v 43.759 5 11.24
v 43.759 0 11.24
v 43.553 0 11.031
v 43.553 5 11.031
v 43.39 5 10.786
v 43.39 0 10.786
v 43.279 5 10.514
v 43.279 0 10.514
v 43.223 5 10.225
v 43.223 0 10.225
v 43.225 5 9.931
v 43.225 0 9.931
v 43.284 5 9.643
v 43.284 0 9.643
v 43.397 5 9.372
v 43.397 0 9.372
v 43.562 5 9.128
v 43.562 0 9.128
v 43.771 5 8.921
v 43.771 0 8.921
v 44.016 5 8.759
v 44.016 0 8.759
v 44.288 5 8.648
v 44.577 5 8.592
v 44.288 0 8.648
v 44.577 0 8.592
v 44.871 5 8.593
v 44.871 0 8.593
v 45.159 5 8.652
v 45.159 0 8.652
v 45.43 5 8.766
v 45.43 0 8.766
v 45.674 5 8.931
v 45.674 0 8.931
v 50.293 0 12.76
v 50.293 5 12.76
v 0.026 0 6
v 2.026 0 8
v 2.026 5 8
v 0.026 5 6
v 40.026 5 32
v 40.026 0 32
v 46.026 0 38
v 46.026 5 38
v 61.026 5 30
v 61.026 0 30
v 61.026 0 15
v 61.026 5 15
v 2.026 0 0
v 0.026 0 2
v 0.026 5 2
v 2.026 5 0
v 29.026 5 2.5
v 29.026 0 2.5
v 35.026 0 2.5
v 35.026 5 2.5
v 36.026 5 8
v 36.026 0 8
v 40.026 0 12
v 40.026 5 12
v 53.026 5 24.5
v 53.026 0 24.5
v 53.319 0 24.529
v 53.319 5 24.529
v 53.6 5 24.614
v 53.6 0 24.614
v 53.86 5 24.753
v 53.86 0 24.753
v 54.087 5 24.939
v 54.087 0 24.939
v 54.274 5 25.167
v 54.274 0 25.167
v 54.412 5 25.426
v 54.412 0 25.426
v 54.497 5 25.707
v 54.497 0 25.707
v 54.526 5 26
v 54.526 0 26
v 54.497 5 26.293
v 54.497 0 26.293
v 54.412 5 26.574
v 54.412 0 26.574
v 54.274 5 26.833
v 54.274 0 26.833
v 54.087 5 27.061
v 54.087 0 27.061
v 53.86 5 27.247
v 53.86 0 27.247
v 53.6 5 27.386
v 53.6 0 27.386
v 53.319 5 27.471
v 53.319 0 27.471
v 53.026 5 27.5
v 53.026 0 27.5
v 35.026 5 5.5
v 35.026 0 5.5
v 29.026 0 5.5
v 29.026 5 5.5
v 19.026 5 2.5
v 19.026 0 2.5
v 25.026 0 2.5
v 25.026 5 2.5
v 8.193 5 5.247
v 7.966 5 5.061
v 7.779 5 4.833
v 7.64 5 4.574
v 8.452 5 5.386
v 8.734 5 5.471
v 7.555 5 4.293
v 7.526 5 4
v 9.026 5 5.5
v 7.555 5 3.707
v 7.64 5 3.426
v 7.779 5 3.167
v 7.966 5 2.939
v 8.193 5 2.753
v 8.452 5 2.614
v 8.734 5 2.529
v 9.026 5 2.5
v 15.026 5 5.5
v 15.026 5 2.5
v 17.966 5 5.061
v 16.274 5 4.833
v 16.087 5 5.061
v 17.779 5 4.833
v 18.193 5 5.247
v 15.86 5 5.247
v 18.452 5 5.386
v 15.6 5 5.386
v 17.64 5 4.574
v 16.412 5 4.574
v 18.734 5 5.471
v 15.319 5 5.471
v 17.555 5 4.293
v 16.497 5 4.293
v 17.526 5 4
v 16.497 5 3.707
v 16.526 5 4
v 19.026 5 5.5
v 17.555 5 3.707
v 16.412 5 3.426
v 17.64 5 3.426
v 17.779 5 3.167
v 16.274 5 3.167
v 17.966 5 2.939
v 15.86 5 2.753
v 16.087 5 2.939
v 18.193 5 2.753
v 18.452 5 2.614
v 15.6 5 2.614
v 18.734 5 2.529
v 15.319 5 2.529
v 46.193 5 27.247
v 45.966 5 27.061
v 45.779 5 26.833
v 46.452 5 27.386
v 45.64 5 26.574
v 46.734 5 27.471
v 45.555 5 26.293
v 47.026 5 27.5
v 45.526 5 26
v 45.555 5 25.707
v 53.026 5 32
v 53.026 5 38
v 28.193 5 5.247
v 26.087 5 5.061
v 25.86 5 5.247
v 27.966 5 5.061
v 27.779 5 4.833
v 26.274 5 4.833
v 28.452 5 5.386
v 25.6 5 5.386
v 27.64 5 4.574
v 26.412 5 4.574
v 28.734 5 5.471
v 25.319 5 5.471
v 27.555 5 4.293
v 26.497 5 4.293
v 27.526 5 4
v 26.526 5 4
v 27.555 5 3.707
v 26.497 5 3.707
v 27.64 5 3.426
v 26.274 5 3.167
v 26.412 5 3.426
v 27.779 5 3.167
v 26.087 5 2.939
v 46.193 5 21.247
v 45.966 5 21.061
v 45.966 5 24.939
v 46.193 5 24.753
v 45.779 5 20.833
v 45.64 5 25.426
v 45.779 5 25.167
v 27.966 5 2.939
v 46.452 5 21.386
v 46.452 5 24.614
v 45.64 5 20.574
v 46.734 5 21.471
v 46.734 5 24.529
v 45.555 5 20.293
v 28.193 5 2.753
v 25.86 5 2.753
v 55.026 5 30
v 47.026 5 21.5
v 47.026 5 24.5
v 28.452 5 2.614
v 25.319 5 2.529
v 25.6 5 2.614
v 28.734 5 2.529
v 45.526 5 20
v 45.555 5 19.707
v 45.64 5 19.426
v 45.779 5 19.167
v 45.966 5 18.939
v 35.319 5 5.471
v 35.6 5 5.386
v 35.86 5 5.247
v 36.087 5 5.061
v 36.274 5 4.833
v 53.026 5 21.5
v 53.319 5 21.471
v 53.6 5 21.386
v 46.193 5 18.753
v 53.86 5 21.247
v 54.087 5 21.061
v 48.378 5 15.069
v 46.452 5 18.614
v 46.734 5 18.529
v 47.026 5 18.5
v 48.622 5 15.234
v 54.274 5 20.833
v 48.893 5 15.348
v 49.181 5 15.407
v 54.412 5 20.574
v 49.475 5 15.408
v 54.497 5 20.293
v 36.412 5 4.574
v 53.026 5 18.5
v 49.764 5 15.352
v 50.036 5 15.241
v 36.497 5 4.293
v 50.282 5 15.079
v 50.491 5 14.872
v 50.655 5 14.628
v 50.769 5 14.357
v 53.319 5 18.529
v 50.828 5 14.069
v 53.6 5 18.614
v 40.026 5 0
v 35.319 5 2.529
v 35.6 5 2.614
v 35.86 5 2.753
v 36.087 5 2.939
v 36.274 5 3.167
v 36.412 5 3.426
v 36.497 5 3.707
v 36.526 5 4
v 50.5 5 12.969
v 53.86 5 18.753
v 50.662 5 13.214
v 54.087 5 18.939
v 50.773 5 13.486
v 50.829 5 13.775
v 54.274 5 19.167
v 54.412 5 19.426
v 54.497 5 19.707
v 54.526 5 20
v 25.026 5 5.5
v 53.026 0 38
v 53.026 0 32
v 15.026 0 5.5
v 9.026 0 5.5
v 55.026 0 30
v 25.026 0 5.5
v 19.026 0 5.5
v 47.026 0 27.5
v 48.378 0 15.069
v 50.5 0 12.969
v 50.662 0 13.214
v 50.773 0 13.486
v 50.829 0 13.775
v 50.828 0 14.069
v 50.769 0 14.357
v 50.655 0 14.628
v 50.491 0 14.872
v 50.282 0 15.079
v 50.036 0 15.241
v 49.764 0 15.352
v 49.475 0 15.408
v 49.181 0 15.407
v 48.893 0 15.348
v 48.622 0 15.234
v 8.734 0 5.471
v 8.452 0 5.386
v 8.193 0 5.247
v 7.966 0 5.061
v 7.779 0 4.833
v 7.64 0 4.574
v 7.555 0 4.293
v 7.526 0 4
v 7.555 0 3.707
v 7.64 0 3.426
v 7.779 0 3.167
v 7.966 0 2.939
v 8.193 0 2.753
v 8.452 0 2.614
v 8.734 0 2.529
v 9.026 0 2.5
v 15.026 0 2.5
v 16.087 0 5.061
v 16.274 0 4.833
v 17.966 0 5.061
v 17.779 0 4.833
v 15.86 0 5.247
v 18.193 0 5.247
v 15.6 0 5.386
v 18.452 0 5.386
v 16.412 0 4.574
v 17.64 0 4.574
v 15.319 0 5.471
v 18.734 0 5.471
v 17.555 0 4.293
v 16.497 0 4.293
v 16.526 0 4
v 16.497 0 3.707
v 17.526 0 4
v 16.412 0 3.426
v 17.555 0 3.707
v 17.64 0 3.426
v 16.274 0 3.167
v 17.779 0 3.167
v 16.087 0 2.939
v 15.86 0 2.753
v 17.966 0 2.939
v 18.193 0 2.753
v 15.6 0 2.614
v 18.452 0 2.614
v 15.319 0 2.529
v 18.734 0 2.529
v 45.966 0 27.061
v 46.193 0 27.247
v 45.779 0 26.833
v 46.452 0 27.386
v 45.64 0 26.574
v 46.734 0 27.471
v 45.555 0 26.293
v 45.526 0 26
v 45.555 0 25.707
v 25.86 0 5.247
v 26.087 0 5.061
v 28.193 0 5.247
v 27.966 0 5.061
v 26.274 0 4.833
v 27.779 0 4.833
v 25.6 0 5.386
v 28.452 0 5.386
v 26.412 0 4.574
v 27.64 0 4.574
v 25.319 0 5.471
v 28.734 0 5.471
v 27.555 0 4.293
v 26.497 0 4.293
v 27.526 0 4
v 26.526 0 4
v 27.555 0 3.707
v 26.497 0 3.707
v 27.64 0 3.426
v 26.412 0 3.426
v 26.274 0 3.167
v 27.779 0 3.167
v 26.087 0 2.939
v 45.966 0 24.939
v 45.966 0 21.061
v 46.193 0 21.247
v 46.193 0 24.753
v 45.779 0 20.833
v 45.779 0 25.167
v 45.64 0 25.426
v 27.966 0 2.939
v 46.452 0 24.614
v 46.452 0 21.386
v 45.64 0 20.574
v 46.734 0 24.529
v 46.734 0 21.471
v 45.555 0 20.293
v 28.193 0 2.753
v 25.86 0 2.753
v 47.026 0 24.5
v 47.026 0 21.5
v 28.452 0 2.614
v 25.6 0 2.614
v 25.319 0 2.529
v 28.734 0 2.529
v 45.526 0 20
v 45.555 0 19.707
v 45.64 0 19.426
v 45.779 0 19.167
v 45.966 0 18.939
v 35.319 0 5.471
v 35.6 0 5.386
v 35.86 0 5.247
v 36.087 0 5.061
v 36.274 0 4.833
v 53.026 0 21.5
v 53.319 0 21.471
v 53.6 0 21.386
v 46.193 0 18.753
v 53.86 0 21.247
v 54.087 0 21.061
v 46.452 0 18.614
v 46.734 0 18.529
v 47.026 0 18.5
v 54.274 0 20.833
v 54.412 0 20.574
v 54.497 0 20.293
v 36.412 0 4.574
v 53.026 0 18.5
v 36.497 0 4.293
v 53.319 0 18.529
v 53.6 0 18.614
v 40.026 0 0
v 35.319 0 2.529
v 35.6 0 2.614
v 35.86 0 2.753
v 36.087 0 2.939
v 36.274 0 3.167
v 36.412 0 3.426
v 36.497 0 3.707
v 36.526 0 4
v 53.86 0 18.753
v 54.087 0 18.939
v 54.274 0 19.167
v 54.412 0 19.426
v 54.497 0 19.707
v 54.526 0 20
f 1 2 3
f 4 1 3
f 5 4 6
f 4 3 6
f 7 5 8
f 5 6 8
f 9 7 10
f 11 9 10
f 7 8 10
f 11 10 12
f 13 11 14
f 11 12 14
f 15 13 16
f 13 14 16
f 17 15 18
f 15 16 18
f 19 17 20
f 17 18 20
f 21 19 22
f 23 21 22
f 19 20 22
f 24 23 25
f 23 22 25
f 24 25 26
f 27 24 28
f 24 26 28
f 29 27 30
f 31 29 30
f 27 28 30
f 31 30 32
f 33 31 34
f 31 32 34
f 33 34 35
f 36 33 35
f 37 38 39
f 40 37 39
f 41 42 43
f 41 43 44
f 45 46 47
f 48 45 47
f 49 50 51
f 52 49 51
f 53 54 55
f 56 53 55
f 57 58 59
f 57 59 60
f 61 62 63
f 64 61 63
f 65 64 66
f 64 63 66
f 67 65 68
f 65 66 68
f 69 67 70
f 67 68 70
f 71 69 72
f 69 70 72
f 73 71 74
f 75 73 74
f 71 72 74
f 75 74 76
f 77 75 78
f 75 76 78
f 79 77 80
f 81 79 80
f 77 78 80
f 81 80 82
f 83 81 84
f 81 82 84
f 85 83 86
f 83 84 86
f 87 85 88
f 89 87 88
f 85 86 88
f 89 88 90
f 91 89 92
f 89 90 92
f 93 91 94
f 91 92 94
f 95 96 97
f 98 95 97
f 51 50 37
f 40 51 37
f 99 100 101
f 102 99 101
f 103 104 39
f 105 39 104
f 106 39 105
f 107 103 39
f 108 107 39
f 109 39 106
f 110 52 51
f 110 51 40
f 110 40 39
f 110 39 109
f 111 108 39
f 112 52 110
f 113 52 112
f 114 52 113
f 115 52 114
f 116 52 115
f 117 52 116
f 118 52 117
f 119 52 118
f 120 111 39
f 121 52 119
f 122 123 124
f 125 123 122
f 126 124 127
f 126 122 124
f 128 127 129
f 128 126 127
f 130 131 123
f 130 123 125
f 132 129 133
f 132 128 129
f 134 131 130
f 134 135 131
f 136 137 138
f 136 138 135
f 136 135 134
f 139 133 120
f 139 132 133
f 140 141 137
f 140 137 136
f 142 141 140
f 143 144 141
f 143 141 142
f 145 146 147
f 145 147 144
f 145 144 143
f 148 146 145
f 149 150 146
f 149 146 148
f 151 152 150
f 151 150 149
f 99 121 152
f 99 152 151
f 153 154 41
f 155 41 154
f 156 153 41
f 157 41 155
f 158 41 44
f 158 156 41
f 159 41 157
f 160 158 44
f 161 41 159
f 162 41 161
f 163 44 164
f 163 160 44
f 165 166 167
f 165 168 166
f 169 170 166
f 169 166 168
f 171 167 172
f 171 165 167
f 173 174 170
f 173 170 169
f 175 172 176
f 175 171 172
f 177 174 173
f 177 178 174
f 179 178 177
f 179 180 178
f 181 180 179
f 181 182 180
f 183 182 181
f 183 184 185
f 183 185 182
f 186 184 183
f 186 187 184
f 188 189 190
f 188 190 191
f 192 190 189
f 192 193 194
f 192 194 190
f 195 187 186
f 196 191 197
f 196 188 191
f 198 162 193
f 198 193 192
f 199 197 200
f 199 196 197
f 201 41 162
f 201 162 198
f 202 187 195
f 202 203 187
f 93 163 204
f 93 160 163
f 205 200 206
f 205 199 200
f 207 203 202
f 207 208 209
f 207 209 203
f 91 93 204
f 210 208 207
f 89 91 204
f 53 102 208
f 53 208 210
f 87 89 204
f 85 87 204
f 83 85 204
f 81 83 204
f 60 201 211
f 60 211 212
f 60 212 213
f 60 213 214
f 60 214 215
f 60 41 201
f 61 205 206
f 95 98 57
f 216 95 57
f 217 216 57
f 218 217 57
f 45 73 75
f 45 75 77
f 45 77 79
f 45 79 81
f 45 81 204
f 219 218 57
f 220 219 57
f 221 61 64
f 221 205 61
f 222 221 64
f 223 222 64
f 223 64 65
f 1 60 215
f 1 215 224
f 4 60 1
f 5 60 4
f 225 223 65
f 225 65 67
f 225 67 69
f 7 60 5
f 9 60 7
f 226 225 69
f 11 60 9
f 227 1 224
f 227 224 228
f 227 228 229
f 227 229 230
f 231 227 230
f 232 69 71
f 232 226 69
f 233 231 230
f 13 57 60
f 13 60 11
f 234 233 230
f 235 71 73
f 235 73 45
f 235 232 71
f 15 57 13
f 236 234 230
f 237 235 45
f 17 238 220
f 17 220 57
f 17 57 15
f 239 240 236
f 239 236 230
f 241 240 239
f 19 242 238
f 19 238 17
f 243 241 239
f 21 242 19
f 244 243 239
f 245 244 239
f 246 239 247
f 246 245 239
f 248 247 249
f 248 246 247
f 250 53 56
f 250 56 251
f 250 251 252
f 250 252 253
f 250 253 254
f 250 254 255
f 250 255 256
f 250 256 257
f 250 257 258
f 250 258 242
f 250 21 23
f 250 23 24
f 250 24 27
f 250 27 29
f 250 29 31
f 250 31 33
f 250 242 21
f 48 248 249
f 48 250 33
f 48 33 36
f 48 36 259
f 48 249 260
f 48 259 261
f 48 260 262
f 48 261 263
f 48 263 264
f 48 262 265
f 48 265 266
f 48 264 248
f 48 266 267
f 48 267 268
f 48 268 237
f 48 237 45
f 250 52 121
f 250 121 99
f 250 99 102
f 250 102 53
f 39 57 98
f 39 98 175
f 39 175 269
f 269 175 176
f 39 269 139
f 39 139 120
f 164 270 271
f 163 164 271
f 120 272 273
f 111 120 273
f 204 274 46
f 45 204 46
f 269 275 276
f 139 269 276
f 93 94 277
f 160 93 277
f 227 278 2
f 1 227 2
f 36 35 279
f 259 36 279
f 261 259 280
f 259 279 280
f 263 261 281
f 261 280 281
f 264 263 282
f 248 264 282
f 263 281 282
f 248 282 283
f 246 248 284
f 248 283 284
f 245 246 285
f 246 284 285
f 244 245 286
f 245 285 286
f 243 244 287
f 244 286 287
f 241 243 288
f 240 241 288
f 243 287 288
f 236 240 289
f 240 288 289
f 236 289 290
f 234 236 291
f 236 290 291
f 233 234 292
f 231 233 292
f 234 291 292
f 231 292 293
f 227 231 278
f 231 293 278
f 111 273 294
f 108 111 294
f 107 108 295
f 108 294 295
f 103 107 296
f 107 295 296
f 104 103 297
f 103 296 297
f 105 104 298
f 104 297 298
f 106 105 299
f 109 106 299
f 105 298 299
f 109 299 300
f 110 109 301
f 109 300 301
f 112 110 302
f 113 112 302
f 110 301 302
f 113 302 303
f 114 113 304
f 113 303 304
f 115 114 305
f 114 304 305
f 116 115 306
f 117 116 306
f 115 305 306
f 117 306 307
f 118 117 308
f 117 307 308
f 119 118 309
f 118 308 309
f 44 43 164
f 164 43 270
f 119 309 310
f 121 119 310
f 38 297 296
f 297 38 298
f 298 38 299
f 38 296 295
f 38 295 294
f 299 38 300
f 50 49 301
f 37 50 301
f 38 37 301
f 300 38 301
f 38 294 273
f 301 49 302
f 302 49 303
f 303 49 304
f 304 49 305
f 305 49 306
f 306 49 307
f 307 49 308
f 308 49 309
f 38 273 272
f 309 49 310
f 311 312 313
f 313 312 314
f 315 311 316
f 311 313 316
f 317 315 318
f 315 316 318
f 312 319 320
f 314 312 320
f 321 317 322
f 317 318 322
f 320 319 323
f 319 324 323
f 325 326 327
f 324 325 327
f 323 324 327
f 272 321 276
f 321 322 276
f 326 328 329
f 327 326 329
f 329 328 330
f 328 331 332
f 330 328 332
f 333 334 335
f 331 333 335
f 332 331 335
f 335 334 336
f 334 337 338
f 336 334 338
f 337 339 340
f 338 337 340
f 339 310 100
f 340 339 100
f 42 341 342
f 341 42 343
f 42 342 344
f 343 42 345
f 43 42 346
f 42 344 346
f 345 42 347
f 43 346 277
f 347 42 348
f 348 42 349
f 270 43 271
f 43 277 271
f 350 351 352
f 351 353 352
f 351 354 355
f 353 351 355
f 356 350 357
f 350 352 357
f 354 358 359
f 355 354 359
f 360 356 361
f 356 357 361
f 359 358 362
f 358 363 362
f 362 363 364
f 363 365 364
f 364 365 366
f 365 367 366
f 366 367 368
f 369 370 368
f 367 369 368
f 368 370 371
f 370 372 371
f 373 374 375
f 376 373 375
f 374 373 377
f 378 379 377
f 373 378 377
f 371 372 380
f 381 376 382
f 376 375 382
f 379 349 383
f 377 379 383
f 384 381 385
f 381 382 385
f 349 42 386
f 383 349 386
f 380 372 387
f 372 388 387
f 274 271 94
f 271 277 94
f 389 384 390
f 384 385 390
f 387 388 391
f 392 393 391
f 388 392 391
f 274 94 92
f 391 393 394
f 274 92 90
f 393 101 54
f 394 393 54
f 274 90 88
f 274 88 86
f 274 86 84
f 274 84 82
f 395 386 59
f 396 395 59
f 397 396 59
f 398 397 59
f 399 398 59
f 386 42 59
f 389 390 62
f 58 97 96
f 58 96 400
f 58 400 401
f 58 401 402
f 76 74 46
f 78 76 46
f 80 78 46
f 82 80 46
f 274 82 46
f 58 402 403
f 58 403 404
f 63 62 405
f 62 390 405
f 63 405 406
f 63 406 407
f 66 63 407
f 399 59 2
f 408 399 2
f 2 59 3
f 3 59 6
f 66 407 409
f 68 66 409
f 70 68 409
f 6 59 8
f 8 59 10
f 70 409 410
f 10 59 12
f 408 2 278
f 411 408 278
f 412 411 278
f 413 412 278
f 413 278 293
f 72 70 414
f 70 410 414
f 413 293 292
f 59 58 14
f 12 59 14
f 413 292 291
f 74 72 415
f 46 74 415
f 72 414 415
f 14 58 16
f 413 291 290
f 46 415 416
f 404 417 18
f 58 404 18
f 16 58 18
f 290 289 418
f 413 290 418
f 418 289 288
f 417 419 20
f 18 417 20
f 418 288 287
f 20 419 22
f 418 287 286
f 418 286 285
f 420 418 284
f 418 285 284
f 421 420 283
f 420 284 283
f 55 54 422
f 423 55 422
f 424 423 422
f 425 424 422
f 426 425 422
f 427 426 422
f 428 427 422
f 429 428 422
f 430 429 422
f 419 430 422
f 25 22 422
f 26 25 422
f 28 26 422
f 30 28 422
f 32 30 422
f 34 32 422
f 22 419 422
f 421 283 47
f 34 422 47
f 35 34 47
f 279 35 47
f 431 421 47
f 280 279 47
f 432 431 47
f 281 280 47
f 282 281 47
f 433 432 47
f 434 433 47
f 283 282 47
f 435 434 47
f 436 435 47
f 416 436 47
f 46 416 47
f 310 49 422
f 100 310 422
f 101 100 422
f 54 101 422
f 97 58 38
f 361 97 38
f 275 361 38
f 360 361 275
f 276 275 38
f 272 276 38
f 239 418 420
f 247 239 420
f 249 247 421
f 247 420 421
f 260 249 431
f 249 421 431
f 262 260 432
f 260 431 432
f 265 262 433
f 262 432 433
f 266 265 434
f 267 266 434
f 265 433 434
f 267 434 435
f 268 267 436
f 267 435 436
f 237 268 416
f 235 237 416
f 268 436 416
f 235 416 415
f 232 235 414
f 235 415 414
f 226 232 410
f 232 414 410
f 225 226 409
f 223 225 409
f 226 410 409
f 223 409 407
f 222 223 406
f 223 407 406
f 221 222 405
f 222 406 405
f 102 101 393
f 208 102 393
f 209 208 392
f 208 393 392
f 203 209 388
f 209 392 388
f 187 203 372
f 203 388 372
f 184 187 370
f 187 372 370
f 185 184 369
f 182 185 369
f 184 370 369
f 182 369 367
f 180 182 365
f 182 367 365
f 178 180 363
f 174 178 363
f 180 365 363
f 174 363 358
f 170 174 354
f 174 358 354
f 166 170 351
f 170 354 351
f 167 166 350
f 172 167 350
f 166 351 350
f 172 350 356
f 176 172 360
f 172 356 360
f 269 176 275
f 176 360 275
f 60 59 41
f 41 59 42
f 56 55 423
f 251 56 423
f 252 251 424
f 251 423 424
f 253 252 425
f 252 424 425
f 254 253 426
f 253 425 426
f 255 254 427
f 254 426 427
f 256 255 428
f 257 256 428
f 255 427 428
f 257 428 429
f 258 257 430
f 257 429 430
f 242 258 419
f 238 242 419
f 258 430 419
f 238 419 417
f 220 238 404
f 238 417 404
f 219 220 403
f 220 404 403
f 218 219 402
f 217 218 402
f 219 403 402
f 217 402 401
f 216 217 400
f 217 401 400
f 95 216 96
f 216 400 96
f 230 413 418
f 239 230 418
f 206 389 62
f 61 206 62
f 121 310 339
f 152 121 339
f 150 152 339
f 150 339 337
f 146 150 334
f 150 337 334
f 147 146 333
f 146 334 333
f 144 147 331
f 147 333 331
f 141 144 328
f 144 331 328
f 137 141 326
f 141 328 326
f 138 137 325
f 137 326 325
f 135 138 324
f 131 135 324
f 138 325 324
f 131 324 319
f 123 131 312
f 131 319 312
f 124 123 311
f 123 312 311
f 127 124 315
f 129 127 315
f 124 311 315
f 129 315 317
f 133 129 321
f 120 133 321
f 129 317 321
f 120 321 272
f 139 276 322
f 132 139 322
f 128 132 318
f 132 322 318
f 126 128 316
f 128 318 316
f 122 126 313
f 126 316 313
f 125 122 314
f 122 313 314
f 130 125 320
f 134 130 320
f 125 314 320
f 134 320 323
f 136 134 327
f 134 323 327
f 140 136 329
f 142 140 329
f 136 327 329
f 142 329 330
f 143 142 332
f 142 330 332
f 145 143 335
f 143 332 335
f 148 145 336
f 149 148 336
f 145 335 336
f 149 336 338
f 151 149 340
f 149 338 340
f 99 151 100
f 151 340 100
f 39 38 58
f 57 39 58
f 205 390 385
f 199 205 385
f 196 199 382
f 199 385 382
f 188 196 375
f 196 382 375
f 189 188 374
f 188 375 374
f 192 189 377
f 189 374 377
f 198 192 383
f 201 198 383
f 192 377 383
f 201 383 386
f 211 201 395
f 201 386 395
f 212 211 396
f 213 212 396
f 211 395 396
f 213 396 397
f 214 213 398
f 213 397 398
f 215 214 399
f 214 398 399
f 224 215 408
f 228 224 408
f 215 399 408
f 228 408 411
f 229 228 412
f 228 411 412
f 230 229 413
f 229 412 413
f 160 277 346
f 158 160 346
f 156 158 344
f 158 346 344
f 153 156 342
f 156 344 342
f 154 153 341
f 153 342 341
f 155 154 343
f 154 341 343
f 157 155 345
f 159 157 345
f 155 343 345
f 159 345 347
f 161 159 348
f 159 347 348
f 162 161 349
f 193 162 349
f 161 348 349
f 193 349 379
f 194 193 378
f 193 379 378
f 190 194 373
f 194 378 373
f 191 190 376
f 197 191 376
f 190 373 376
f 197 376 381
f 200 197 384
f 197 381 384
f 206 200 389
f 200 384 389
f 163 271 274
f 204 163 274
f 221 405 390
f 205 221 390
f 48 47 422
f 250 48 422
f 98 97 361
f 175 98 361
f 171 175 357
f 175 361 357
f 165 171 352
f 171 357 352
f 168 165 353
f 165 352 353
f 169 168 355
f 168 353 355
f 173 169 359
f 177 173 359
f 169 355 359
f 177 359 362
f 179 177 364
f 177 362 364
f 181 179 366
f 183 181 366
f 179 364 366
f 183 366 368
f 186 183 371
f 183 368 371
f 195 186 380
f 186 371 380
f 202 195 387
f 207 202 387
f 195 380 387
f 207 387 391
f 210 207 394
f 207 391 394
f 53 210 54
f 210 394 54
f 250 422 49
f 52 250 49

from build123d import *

# Parameters (mm, degrees)
BOSS_EXTRUDE1_DEPTH = 5
CHAMFER1_SIZE       = 2
CHAMFER2_SIZE       = 6
CHAMFER3_SIZE       = 4


with BuildPart() as part:
    # Sketch2 → Boss-Extrude1 (new body)
    with BuildSketch(Plane(origin=(0, 0, 0), x_dir=(1, 0, 0), z_dir=(0, 1, 0))):
        Polygon((40.026305405, 0), (0.026305405, 0), (0.026305405, -8), (40.026305405, -8), (40.026305405, -38), (53.026305405, -38), (53.026305405, -32), (55.026305405, -30), (61.026305405, -30), (61.026305405, -15), align=None)
        with BuildLine():
            ThreePointArc((47.026305405, -27.5), (45.526305405, -26), (47.026305405, -24.5))
            Line((47.026305405, -24.5), (53.026305405, -24.5))
            ThreePointArc((53.026305405, -24.5), (54.526305405, -26), (53.026305405, -27.5))
            Line((53.026305405, -27.5), (47.026305405, -27.5))
        make_face(mode=Mode.SUBTRACT)
        with BuildLine():
            ThreePointArc((47.026305405, -21.5), (45.526305405, -20), (47.026305405, -18.5))
            Line((47.026305405, -18.5), (53.026305405, -18.5))
            ThreePointArc((53.026305405, -18.5), (54.526305405, -20), (53.026305405, -21.5))
            Line((53.026305405, -21.5), (47.026305405, -21.5))
        make_face(mode=Mode.SUBTRACT)
        with BuildLine():
            ThreePointArc((9.026305405, -5.5), (7.526305405, -4), (9.026305405, -2.5))
            Line((9.026305405, -2.5), (15.026305405, -2.5))
            ThreePointArc((15.026305405, -2.5), (16.526305405, -4), (15.026305405, -5.5))
            Line((15.026305405, -5.5), (9.026305405, -5.5))
        make_face(mode=Mode.SUBTRACT)
        with BuildLine():
            ThreePointArc((19.026305405, -5.5), (17.526305405, -4), (19.026305405, -2.5))
            Line((19.026305405, -2.5), (25.026305405, -2.5))
            ThreePointArc((25.026305405, -2.5), (26.526305405, -4), (25.026305405, -5.5))
            Line((25.026305405, -5.5), (19.026305405, -5.5))
        make_face(mode=Mode.SUBTRACT)
        with BuildLine():
            ThreePointArc((43.759423492, -11.240077261), (43.562000753, -9.127963566), (45.674114448, -8.930540827))
            Line((45.674114448, -8.930540827), (50.293187317, -12.759922739))
            ThreePointArc((50.293187317, -12.759922739), (50.490610056, -14.872036434), (48.378496361, -15.069459173))
            Line((48.378496361, -15.069459173), (43.759423492, -11.240077261))
        make_face(mode=Mode.SUBTRACT)
        with BuildLine():
            ThreePointArc((29.026305405, -5.5), (27.526305405, -4), (29.026305405, -2.5))
            Line((29.026305405, -2.5), (35.026305405, -2.5))
            ThreePointArc((35.026305405, -2.5), (36.526305405, -4), (35.026305405, -5.5))
            Line((35.026305405, -5.5), (29.026305405, -5.5))
        make_face(mode=Mode.SUBTRACT)
    extrude(amount=BOSS_EXTRUDE1_DEPTH)

    # Chamfer1
    chamfer1_edges = [part.edges().sort_by_distance(p)[0] for p in [
        (0.026305405, 2.5, 8),
        (0.026305405, 2.5, 0),
    ]]
    chamfer(chamfer1_edges, length=CHAMFER1_SIZE)

    # Chamfer2
    chamfer2_edges = [part.edges().sort_by_distance(p)[0] for p in [
        (40.026305405, 2.5, 38),
    ]]
    chamfer(chamfer2_edges, length=CHAMFER2_SIZE)

    # Chamfer3
    chamfer3_edges = [part.edges().sort_by_distance(p)[0] for p in [
        (40.026305405, 2.5, 8),
    ]]
    chamfer(chamfer3_edges, length=CHAMFER3_SIZE)


solid = part.part
